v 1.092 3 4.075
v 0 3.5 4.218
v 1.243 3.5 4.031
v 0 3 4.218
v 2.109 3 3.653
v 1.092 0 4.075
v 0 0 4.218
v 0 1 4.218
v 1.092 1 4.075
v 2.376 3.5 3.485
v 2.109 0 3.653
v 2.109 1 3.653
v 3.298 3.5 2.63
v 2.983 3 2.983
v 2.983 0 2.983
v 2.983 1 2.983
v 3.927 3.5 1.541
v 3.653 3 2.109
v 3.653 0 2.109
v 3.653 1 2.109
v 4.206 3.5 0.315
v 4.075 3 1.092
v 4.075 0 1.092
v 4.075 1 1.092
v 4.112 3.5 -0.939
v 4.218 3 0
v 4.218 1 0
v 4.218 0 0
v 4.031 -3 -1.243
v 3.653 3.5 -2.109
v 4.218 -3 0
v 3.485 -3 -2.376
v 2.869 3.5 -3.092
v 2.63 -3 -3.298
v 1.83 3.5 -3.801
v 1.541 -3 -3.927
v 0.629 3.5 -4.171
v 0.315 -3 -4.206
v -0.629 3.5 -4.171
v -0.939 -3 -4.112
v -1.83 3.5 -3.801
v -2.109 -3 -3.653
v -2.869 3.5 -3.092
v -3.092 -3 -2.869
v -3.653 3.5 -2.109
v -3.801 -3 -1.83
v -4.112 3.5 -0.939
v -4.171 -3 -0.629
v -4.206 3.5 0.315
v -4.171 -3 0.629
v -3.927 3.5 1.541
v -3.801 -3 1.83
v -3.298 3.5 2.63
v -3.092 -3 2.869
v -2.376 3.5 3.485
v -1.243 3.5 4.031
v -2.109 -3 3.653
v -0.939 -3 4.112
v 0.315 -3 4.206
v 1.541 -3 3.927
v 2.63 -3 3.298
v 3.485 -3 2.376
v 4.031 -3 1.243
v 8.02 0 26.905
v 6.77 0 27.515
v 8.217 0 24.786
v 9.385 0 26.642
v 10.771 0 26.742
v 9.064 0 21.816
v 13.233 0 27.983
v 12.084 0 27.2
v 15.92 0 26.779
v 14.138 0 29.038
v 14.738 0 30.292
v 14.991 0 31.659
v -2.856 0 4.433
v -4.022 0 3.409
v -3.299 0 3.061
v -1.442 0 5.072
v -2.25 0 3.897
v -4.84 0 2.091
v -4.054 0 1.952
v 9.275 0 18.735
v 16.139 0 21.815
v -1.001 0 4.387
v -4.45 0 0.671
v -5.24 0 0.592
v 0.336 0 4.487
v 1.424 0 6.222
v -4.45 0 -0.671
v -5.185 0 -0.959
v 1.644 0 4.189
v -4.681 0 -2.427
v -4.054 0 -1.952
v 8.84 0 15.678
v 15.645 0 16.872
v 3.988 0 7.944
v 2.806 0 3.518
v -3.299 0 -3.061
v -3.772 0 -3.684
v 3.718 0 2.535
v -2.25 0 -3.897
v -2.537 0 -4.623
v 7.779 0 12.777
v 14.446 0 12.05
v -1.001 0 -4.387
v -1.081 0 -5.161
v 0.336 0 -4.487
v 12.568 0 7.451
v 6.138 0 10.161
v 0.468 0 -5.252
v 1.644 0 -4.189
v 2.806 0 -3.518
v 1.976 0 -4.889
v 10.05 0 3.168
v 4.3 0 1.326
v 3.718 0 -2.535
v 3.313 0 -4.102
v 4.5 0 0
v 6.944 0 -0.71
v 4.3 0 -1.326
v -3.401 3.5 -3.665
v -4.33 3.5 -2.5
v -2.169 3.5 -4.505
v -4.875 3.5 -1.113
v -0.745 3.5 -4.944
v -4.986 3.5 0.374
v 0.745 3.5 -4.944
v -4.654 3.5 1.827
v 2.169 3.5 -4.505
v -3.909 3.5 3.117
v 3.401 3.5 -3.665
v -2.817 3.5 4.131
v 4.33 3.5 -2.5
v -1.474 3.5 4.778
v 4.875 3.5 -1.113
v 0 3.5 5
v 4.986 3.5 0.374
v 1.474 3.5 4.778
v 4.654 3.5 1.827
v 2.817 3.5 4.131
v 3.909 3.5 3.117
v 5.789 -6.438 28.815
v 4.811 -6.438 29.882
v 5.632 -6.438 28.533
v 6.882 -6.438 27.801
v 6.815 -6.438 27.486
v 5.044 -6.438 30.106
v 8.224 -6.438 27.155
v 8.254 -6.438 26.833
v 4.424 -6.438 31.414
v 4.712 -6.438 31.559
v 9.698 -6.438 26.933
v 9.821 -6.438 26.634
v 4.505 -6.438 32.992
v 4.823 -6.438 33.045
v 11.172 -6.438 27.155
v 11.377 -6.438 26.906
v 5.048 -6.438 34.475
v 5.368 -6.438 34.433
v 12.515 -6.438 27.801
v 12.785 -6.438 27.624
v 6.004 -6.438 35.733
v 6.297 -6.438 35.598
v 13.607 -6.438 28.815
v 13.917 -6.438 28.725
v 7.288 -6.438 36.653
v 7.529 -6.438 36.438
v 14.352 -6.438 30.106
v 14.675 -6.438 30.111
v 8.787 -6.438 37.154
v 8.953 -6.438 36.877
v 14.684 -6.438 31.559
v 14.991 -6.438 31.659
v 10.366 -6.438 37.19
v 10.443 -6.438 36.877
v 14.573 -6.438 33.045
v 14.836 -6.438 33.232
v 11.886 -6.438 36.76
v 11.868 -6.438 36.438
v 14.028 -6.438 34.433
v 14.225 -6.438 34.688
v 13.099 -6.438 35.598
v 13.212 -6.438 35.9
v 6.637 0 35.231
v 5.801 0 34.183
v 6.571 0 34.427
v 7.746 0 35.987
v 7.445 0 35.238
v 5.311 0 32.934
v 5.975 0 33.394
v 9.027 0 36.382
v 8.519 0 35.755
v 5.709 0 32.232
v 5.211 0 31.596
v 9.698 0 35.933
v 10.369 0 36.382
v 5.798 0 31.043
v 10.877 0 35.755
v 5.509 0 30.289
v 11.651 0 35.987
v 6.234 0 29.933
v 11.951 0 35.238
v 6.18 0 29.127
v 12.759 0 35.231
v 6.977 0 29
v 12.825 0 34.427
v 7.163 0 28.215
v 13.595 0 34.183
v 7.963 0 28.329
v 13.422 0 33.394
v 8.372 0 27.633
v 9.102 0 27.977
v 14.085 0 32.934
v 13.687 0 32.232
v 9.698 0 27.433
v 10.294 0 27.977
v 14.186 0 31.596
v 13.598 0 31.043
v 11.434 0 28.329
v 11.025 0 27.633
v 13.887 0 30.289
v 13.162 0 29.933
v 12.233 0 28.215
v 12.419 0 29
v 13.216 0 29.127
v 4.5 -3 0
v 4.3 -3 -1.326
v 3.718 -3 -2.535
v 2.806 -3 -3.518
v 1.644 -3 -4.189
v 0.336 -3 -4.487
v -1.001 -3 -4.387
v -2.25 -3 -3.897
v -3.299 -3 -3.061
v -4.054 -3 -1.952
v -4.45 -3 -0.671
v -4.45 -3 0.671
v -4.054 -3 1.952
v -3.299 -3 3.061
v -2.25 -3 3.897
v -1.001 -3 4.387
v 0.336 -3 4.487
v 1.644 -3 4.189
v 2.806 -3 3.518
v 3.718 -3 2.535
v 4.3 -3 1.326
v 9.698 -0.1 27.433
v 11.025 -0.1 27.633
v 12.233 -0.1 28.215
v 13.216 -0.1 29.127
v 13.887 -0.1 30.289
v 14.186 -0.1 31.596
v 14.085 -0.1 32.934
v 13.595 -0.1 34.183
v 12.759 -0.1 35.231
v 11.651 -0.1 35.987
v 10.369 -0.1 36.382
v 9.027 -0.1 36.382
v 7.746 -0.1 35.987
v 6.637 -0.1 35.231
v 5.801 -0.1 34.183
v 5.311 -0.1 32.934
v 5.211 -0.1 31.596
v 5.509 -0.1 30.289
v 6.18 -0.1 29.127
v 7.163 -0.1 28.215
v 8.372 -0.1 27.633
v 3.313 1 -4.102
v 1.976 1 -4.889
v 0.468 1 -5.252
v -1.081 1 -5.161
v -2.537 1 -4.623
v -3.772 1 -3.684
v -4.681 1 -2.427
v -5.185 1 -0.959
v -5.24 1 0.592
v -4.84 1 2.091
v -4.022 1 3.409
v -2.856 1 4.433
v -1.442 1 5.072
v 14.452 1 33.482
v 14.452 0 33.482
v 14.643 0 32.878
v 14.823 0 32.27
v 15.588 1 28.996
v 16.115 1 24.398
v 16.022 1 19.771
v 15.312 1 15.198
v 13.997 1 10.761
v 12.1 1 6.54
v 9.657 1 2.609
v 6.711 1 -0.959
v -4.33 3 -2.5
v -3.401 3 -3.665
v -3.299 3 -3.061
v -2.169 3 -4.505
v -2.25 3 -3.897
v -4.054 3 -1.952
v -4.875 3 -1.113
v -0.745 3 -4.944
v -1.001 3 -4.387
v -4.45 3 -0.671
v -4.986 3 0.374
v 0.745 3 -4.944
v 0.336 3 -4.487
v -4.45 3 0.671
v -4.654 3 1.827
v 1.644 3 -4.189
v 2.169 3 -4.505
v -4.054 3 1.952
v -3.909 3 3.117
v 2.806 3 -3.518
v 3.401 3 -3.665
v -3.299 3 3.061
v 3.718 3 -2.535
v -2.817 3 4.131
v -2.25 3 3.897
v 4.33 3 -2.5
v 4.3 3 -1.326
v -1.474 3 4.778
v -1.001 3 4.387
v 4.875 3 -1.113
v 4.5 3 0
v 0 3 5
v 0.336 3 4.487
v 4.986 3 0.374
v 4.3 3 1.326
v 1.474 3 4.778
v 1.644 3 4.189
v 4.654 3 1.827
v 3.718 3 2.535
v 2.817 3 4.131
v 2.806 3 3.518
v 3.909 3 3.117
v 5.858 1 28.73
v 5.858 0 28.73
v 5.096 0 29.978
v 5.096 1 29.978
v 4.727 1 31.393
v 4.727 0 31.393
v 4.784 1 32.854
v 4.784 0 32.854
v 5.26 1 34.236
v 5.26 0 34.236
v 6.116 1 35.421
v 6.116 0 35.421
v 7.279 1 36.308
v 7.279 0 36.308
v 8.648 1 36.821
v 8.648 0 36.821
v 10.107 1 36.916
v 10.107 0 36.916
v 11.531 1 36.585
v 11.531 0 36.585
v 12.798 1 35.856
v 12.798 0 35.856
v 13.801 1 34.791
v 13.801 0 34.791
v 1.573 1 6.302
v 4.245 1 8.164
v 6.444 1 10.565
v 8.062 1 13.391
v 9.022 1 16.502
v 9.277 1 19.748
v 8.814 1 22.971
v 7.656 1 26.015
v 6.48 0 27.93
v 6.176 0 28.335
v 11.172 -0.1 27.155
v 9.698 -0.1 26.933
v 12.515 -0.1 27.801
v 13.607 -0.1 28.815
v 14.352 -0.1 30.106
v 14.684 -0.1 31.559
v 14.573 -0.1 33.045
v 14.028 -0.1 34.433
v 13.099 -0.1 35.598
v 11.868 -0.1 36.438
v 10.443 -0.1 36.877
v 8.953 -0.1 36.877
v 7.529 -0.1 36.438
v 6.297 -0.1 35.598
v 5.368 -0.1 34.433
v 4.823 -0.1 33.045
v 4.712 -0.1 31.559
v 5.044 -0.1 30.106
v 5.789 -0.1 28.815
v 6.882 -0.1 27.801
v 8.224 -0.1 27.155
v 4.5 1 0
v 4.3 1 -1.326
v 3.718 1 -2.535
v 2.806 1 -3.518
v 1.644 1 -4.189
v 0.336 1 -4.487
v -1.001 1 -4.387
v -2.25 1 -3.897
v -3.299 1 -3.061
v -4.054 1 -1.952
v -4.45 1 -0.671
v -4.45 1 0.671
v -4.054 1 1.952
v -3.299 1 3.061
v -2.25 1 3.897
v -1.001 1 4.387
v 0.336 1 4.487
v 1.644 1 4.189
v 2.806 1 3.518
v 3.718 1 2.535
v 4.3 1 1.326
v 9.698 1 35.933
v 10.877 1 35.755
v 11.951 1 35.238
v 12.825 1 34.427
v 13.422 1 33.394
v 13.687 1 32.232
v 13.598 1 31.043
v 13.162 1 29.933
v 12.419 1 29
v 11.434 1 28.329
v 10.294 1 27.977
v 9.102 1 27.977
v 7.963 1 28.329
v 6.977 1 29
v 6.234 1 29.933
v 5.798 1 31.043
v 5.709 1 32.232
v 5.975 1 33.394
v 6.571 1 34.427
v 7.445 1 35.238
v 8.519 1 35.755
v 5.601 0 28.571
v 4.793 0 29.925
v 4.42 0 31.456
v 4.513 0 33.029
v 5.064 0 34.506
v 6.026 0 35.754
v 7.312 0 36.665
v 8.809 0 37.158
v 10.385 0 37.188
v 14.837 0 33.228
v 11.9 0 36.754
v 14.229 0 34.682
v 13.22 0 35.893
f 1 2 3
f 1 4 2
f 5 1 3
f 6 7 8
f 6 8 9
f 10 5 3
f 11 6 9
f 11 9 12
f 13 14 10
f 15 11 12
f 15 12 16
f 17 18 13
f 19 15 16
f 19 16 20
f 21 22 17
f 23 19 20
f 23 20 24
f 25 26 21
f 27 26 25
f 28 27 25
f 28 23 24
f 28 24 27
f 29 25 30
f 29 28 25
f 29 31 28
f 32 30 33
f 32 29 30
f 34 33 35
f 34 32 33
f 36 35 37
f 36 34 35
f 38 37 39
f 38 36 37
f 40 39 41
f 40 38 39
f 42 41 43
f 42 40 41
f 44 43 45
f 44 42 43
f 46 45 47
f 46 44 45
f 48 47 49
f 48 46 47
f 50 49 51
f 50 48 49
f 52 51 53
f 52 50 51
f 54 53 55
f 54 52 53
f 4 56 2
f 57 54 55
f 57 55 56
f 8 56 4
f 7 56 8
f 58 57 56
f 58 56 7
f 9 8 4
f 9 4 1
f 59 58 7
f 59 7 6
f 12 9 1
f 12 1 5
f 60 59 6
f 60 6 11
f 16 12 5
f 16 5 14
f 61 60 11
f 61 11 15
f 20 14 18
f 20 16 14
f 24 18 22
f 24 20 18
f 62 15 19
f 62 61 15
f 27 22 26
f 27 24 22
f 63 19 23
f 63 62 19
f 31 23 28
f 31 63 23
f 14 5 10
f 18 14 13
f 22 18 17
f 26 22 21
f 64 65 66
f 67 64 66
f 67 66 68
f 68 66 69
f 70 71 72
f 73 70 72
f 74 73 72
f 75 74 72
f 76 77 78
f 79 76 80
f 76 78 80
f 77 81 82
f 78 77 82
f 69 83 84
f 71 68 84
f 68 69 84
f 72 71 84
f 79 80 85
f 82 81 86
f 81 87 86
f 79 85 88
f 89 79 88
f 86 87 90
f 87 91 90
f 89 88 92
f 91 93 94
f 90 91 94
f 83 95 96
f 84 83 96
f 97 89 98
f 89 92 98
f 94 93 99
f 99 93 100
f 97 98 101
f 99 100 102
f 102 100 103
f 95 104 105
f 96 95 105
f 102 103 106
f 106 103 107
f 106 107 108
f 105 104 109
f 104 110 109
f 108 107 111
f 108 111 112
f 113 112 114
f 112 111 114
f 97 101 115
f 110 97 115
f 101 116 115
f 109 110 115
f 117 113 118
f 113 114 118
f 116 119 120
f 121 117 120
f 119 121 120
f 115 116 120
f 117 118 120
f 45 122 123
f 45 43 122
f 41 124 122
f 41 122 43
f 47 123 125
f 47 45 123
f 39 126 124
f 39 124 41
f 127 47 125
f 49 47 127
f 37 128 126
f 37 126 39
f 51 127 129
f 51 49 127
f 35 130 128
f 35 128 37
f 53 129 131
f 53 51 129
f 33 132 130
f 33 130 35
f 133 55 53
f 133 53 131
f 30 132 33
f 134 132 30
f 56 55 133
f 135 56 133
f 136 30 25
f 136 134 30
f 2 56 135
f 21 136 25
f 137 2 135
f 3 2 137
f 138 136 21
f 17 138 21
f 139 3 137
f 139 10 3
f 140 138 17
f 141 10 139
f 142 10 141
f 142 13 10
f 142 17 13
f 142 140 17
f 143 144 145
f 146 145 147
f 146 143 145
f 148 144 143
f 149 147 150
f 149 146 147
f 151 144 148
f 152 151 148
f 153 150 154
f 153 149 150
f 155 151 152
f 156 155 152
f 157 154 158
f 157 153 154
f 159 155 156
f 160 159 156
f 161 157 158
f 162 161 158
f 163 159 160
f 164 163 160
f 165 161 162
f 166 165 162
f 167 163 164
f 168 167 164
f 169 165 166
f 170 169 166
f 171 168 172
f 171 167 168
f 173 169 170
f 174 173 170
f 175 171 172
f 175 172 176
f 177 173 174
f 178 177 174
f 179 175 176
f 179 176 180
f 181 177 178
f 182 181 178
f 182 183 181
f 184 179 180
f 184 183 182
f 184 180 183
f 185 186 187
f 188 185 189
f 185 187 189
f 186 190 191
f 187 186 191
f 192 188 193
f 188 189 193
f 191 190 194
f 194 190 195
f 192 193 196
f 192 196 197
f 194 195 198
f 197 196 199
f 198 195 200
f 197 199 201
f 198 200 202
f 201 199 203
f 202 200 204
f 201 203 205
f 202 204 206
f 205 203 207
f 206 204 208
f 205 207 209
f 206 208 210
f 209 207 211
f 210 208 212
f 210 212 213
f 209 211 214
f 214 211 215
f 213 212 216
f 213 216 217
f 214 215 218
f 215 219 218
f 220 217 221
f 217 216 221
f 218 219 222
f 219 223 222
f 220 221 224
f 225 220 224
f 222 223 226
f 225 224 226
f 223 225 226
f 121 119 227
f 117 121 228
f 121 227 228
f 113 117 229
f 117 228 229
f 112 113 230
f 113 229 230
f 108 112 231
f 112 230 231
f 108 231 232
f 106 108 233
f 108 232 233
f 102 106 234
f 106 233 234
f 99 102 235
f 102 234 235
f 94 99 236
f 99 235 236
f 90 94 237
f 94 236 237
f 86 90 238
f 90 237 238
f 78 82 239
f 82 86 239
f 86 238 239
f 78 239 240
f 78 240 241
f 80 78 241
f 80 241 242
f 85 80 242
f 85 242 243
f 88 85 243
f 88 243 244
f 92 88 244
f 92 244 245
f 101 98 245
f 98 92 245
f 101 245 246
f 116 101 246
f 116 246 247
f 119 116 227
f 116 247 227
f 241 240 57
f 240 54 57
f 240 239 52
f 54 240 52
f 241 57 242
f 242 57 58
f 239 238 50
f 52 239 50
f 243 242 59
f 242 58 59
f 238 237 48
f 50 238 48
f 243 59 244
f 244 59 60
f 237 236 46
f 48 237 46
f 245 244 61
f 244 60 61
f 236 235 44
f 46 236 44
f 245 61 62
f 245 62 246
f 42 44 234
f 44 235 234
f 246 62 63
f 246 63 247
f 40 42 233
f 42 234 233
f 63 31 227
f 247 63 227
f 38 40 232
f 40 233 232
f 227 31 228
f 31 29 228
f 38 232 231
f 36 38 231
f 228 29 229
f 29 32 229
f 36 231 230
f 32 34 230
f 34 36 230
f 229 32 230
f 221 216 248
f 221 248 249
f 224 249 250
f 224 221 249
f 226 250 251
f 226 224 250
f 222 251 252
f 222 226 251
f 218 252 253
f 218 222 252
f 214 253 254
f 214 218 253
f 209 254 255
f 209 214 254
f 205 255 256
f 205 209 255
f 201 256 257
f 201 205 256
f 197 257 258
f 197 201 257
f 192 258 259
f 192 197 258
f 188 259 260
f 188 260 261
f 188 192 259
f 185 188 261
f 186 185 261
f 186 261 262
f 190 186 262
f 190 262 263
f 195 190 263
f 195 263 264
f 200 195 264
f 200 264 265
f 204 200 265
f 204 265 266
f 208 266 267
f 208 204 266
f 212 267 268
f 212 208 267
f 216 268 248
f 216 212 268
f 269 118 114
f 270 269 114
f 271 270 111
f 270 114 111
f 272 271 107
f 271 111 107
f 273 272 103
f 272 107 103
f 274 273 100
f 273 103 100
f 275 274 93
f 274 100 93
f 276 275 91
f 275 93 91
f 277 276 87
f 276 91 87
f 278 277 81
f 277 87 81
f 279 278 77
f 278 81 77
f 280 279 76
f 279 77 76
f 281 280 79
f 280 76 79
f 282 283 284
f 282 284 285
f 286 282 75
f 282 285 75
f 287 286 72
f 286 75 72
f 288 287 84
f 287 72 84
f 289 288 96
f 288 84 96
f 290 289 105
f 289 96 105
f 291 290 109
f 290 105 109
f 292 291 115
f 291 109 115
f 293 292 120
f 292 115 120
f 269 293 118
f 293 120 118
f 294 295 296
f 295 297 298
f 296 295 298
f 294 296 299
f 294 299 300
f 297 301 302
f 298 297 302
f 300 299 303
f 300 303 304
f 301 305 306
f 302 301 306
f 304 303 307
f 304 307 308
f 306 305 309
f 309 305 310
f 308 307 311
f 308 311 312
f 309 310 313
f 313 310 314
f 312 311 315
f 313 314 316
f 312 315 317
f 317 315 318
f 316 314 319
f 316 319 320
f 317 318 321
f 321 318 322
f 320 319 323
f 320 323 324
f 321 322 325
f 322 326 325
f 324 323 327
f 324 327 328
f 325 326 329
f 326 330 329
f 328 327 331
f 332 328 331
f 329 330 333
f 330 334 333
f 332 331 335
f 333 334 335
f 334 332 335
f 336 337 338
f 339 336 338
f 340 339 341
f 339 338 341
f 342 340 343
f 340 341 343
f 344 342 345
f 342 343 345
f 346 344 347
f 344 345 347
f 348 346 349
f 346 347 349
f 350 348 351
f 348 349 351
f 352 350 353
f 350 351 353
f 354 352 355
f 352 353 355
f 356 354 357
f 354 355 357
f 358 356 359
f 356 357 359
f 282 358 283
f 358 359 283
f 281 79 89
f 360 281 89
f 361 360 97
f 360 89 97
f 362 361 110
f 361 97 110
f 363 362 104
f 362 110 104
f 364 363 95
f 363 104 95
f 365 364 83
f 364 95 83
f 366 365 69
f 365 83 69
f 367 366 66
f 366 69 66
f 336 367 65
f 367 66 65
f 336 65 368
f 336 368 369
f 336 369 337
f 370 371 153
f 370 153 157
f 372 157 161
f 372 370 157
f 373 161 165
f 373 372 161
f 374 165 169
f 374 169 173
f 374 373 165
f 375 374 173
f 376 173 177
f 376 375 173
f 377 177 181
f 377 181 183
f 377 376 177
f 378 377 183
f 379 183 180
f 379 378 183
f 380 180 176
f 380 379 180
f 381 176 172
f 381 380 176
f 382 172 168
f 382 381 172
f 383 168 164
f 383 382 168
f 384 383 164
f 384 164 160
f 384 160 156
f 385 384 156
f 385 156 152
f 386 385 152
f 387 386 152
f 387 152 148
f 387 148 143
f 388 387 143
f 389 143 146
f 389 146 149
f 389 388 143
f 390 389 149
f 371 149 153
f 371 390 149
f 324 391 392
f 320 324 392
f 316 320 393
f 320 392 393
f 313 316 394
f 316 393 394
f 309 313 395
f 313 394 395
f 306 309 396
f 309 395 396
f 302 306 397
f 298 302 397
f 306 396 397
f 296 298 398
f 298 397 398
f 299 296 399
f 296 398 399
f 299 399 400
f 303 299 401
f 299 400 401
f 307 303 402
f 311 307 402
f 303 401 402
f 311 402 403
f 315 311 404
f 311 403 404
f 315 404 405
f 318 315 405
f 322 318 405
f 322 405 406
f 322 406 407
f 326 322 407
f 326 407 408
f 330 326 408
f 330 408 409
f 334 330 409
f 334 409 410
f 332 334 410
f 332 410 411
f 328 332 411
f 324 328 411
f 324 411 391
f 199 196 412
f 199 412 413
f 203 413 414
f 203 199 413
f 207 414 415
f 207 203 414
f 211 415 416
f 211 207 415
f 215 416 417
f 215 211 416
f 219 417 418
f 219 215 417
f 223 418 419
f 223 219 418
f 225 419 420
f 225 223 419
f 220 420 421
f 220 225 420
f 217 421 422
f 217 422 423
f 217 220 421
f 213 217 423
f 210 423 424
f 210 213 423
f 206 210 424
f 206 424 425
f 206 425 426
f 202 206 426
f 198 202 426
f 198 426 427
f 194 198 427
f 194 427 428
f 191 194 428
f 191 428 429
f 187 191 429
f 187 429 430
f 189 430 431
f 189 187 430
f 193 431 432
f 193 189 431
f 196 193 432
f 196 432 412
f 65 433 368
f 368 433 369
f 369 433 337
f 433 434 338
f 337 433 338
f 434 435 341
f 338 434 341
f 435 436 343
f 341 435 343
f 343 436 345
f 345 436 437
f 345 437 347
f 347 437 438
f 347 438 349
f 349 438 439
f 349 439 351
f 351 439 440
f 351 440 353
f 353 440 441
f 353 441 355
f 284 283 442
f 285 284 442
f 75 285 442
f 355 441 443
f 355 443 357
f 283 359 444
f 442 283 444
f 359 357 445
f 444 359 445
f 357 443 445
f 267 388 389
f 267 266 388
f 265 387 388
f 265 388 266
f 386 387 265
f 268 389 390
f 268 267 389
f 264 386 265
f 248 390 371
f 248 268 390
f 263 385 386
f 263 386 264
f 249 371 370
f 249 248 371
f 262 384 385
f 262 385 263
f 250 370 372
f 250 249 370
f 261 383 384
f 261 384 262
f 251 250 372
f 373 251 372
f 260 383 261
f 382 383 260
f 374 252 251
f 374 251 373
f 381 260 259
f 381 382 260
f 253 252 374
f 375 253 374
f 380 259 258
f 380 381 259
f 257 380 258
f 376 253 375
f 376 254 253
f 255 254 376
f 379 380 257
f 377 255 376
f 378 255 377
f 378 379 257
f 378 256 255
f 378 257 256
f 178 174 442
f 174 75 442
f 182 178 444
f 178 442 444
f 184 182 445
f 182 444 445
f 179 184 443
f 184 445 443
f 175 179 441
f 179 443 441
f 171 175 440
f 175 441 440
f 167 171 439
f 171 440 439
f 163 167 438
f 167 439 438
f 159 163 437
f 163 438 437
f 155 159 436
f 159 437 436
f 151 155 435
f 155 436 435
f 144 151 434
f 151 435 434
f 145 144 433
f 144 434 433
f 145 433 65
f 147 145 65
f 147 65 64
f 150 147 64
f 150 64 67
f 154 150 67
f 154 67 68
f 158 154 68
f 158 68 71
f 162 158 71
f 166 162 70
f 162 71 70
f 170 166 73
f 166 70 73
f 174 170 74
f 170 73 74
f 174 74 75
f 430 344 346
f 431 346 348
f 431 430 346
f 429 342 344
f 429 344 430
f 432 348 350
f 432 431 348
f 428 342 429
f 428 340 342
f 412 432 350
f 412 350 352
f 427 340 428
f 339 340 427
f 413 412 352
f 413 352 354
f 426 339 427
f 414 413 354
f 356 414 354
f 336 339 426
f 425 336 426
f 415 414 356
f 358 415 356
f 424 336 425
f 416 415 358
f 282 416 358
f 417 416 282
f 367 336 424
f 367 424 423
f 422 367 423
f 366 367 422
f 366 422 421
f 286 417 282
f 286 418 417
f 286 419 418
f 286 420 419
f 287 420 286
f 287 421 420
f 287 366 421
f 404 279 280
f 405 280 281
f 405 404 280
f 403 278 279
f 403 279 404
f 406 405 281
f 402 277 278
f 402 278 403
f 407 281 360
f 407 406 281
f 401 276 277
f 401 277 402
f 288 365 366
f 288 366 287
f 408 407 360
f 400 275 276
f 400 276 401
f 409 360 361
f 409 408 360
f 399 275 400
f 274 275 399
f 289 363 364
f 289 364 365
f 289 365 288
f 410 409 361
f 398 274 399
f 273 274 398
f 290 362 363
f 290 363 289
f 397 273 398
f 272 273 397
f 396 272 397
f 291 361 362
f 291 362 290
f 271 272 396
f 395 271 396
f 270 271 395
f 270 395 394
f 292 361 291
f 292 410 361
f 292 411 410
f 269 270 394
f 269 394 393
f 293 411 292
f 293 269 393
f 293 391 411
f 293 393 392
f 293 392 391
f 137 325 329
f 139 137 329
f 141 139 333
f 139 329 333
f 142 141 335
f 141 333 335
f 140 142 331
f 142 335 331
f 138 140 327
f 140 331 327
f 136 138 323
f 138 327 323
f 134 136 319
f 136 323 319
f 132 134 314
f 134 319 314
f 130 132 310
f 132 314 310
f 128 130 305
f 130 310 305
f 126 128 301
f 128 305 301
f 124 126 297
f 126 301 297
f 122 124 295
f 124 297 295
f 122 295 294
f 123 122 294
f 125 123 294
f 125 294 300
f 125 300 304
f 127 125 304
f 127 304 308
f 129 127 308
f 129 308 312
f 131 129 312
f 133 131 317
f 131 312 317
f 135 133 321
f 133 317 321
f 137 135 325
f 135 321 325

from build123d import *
from build123d.topology import SkipClean

# Parameters (mm, degrees)
CROQUIS1_R                    = 4.218255418
CROQUIS1_R_2                  = 4
SALIENTE_EXTRUIR1_DEPTH       = 1
SALIENTE_EXTRUIR2_START       = -4
SALIENTE_EXTRUIR2_OUTLINE_R   = 4.5
SALIENTE_EXTRUIR2_OUTLINE_R_2 = 4.218255418
SALIENTE_EXTRUIR2_DEPTH       = 6
CROQUIS3_R                    = 5
CROQUIS3_R_2                  = 4.218255418
SALIENTE_EXTRUIR3_DEPTH       = 0.5
CROQUIS4_R                    = 5.3
CROQUIS4_R_2                  = 4.5
SALIENTE_EXTRUIR5_DEPTH       = 0.1
CROQUIS5_R                    = 5.3
CROQUIS5_R_2                  = 5
SALIENTE_EXTRUIR6_DEPTH       = 6.337921


# Read off the part's stored shape, not the designer's step: Saliente-Extruir2
with BuildPart() as part:
    # Croquis1 → Saliente-Extruir1 (new body)
    with BuildSketch(Plane(origin=(0, 0, 0), x_dir=(1, 0, 0), z_dir=(0, 1, 0))):
        with BuildLine():
            ThreePointArc((3.313459582, 4.10165926), (-4.681239764, 2.42664735), (-1.441875065, -5.071845757))
            ThreePointArc((-1.441875065, -5.071845757), (8.628437932, -14.919813028), (5.858493799, -28.729993067))
            ThreePointArc((5.858493799, -28.729993067), (7.278526743, -36.308249114), (14.452018201, -33.482036353))
            ThreePointArc((14.452018201, -33.482036353), (14.728457578, -12.957711758), (3.313459582, 4.10165926))
        make_face()
        with Locations(Location((0, 0, 0), (0, 0, 270))):
            Circle(CROQUIS1_R, mode=Mode.SUBTRACT)
        with Locations(Location((9.698123587, -31.932686167, 0), (0, 0, 270))):
            Circle(CROQUIS1_R_2, mode=Mode.SUBTRACT)
    extrude(amount=SALIENTE_EXTRUIR1_DEPTH)

    # Saliente-Extruir2 outline → Saliente-Extruir2 (add)
    with SkipClean():  # the faces are left unmerged after this step: merging them gives an invalid solid
        with BuildSketch(Plane(origin=(0, 1, 0), x_dir=(1, 0, 0), z_dir=(0, 1, 0)).offset(SALIENTE_EXTRUIR2_START)):
            Circle(SALIENTE_EXTRUIR2_OUTLINE_R)
            Circle(SALIENTE_EXTRUIR2_OUTLINE_R_2, mode=Mode.SUBTRACT)
        extrude(amount=SALIENTE_EXTRUIR2_DEPTH)

    # Croquis3 → Saliente-Extruir3 (add)
    with BuildSketch(Plane(origin=(0, 3, 0), x_dir=(1, 0, 0), z_dir=(0, 1, 0))):
        with Locations(Location((0, 0, 0), (0, 0, 270))):
            Circle(CROQUIS3_R)
        with Locations(Location((0, 0, 0), (0, 0, 270))):
            Circle(CROQUIS3_R_2, mode=Mode.SUBTRACT)
    extrude(amount=SALIENTE_EXTRUIR3_DEPTH)

    # Croquis4 → Saliente-Extruir5 (add)
    with BuildSketch(Plane.XZ):
        with Locations(Location((9.698123587, 31.932686167, 0), (0, 0, 357.04362328))):
            Circle(CROQUIS4_R)
        with Locations(Location((9.698123587, 31.932686167, 0), (0, 0, 270))):
            Circle(CROQUIS4_R_2, mode=Mode.SUBTRACT)
    extrude(amount=SALIENTE_EXTRUIR5_DEPTH)

    # Croquis5 → Saliente-Extruir6 (add)
    with BuildSketch(Plane.XZ.offset(0.1)):
        with Locations(Location((9.698123587, 31.932686167, 0), (0, 0, 357.04362328))):
            Circle(CROQUIS5_R)
        with Locations(Location((9.698123587, 31.932686167, 0), (0, 0, 270))):
            Circle(CROQUIS5_R_2, mode=Mode.SUBTRACT)
    extrude(amount=SALIENTE_EXTRUIR6_DEPTH)


solid = part.part
